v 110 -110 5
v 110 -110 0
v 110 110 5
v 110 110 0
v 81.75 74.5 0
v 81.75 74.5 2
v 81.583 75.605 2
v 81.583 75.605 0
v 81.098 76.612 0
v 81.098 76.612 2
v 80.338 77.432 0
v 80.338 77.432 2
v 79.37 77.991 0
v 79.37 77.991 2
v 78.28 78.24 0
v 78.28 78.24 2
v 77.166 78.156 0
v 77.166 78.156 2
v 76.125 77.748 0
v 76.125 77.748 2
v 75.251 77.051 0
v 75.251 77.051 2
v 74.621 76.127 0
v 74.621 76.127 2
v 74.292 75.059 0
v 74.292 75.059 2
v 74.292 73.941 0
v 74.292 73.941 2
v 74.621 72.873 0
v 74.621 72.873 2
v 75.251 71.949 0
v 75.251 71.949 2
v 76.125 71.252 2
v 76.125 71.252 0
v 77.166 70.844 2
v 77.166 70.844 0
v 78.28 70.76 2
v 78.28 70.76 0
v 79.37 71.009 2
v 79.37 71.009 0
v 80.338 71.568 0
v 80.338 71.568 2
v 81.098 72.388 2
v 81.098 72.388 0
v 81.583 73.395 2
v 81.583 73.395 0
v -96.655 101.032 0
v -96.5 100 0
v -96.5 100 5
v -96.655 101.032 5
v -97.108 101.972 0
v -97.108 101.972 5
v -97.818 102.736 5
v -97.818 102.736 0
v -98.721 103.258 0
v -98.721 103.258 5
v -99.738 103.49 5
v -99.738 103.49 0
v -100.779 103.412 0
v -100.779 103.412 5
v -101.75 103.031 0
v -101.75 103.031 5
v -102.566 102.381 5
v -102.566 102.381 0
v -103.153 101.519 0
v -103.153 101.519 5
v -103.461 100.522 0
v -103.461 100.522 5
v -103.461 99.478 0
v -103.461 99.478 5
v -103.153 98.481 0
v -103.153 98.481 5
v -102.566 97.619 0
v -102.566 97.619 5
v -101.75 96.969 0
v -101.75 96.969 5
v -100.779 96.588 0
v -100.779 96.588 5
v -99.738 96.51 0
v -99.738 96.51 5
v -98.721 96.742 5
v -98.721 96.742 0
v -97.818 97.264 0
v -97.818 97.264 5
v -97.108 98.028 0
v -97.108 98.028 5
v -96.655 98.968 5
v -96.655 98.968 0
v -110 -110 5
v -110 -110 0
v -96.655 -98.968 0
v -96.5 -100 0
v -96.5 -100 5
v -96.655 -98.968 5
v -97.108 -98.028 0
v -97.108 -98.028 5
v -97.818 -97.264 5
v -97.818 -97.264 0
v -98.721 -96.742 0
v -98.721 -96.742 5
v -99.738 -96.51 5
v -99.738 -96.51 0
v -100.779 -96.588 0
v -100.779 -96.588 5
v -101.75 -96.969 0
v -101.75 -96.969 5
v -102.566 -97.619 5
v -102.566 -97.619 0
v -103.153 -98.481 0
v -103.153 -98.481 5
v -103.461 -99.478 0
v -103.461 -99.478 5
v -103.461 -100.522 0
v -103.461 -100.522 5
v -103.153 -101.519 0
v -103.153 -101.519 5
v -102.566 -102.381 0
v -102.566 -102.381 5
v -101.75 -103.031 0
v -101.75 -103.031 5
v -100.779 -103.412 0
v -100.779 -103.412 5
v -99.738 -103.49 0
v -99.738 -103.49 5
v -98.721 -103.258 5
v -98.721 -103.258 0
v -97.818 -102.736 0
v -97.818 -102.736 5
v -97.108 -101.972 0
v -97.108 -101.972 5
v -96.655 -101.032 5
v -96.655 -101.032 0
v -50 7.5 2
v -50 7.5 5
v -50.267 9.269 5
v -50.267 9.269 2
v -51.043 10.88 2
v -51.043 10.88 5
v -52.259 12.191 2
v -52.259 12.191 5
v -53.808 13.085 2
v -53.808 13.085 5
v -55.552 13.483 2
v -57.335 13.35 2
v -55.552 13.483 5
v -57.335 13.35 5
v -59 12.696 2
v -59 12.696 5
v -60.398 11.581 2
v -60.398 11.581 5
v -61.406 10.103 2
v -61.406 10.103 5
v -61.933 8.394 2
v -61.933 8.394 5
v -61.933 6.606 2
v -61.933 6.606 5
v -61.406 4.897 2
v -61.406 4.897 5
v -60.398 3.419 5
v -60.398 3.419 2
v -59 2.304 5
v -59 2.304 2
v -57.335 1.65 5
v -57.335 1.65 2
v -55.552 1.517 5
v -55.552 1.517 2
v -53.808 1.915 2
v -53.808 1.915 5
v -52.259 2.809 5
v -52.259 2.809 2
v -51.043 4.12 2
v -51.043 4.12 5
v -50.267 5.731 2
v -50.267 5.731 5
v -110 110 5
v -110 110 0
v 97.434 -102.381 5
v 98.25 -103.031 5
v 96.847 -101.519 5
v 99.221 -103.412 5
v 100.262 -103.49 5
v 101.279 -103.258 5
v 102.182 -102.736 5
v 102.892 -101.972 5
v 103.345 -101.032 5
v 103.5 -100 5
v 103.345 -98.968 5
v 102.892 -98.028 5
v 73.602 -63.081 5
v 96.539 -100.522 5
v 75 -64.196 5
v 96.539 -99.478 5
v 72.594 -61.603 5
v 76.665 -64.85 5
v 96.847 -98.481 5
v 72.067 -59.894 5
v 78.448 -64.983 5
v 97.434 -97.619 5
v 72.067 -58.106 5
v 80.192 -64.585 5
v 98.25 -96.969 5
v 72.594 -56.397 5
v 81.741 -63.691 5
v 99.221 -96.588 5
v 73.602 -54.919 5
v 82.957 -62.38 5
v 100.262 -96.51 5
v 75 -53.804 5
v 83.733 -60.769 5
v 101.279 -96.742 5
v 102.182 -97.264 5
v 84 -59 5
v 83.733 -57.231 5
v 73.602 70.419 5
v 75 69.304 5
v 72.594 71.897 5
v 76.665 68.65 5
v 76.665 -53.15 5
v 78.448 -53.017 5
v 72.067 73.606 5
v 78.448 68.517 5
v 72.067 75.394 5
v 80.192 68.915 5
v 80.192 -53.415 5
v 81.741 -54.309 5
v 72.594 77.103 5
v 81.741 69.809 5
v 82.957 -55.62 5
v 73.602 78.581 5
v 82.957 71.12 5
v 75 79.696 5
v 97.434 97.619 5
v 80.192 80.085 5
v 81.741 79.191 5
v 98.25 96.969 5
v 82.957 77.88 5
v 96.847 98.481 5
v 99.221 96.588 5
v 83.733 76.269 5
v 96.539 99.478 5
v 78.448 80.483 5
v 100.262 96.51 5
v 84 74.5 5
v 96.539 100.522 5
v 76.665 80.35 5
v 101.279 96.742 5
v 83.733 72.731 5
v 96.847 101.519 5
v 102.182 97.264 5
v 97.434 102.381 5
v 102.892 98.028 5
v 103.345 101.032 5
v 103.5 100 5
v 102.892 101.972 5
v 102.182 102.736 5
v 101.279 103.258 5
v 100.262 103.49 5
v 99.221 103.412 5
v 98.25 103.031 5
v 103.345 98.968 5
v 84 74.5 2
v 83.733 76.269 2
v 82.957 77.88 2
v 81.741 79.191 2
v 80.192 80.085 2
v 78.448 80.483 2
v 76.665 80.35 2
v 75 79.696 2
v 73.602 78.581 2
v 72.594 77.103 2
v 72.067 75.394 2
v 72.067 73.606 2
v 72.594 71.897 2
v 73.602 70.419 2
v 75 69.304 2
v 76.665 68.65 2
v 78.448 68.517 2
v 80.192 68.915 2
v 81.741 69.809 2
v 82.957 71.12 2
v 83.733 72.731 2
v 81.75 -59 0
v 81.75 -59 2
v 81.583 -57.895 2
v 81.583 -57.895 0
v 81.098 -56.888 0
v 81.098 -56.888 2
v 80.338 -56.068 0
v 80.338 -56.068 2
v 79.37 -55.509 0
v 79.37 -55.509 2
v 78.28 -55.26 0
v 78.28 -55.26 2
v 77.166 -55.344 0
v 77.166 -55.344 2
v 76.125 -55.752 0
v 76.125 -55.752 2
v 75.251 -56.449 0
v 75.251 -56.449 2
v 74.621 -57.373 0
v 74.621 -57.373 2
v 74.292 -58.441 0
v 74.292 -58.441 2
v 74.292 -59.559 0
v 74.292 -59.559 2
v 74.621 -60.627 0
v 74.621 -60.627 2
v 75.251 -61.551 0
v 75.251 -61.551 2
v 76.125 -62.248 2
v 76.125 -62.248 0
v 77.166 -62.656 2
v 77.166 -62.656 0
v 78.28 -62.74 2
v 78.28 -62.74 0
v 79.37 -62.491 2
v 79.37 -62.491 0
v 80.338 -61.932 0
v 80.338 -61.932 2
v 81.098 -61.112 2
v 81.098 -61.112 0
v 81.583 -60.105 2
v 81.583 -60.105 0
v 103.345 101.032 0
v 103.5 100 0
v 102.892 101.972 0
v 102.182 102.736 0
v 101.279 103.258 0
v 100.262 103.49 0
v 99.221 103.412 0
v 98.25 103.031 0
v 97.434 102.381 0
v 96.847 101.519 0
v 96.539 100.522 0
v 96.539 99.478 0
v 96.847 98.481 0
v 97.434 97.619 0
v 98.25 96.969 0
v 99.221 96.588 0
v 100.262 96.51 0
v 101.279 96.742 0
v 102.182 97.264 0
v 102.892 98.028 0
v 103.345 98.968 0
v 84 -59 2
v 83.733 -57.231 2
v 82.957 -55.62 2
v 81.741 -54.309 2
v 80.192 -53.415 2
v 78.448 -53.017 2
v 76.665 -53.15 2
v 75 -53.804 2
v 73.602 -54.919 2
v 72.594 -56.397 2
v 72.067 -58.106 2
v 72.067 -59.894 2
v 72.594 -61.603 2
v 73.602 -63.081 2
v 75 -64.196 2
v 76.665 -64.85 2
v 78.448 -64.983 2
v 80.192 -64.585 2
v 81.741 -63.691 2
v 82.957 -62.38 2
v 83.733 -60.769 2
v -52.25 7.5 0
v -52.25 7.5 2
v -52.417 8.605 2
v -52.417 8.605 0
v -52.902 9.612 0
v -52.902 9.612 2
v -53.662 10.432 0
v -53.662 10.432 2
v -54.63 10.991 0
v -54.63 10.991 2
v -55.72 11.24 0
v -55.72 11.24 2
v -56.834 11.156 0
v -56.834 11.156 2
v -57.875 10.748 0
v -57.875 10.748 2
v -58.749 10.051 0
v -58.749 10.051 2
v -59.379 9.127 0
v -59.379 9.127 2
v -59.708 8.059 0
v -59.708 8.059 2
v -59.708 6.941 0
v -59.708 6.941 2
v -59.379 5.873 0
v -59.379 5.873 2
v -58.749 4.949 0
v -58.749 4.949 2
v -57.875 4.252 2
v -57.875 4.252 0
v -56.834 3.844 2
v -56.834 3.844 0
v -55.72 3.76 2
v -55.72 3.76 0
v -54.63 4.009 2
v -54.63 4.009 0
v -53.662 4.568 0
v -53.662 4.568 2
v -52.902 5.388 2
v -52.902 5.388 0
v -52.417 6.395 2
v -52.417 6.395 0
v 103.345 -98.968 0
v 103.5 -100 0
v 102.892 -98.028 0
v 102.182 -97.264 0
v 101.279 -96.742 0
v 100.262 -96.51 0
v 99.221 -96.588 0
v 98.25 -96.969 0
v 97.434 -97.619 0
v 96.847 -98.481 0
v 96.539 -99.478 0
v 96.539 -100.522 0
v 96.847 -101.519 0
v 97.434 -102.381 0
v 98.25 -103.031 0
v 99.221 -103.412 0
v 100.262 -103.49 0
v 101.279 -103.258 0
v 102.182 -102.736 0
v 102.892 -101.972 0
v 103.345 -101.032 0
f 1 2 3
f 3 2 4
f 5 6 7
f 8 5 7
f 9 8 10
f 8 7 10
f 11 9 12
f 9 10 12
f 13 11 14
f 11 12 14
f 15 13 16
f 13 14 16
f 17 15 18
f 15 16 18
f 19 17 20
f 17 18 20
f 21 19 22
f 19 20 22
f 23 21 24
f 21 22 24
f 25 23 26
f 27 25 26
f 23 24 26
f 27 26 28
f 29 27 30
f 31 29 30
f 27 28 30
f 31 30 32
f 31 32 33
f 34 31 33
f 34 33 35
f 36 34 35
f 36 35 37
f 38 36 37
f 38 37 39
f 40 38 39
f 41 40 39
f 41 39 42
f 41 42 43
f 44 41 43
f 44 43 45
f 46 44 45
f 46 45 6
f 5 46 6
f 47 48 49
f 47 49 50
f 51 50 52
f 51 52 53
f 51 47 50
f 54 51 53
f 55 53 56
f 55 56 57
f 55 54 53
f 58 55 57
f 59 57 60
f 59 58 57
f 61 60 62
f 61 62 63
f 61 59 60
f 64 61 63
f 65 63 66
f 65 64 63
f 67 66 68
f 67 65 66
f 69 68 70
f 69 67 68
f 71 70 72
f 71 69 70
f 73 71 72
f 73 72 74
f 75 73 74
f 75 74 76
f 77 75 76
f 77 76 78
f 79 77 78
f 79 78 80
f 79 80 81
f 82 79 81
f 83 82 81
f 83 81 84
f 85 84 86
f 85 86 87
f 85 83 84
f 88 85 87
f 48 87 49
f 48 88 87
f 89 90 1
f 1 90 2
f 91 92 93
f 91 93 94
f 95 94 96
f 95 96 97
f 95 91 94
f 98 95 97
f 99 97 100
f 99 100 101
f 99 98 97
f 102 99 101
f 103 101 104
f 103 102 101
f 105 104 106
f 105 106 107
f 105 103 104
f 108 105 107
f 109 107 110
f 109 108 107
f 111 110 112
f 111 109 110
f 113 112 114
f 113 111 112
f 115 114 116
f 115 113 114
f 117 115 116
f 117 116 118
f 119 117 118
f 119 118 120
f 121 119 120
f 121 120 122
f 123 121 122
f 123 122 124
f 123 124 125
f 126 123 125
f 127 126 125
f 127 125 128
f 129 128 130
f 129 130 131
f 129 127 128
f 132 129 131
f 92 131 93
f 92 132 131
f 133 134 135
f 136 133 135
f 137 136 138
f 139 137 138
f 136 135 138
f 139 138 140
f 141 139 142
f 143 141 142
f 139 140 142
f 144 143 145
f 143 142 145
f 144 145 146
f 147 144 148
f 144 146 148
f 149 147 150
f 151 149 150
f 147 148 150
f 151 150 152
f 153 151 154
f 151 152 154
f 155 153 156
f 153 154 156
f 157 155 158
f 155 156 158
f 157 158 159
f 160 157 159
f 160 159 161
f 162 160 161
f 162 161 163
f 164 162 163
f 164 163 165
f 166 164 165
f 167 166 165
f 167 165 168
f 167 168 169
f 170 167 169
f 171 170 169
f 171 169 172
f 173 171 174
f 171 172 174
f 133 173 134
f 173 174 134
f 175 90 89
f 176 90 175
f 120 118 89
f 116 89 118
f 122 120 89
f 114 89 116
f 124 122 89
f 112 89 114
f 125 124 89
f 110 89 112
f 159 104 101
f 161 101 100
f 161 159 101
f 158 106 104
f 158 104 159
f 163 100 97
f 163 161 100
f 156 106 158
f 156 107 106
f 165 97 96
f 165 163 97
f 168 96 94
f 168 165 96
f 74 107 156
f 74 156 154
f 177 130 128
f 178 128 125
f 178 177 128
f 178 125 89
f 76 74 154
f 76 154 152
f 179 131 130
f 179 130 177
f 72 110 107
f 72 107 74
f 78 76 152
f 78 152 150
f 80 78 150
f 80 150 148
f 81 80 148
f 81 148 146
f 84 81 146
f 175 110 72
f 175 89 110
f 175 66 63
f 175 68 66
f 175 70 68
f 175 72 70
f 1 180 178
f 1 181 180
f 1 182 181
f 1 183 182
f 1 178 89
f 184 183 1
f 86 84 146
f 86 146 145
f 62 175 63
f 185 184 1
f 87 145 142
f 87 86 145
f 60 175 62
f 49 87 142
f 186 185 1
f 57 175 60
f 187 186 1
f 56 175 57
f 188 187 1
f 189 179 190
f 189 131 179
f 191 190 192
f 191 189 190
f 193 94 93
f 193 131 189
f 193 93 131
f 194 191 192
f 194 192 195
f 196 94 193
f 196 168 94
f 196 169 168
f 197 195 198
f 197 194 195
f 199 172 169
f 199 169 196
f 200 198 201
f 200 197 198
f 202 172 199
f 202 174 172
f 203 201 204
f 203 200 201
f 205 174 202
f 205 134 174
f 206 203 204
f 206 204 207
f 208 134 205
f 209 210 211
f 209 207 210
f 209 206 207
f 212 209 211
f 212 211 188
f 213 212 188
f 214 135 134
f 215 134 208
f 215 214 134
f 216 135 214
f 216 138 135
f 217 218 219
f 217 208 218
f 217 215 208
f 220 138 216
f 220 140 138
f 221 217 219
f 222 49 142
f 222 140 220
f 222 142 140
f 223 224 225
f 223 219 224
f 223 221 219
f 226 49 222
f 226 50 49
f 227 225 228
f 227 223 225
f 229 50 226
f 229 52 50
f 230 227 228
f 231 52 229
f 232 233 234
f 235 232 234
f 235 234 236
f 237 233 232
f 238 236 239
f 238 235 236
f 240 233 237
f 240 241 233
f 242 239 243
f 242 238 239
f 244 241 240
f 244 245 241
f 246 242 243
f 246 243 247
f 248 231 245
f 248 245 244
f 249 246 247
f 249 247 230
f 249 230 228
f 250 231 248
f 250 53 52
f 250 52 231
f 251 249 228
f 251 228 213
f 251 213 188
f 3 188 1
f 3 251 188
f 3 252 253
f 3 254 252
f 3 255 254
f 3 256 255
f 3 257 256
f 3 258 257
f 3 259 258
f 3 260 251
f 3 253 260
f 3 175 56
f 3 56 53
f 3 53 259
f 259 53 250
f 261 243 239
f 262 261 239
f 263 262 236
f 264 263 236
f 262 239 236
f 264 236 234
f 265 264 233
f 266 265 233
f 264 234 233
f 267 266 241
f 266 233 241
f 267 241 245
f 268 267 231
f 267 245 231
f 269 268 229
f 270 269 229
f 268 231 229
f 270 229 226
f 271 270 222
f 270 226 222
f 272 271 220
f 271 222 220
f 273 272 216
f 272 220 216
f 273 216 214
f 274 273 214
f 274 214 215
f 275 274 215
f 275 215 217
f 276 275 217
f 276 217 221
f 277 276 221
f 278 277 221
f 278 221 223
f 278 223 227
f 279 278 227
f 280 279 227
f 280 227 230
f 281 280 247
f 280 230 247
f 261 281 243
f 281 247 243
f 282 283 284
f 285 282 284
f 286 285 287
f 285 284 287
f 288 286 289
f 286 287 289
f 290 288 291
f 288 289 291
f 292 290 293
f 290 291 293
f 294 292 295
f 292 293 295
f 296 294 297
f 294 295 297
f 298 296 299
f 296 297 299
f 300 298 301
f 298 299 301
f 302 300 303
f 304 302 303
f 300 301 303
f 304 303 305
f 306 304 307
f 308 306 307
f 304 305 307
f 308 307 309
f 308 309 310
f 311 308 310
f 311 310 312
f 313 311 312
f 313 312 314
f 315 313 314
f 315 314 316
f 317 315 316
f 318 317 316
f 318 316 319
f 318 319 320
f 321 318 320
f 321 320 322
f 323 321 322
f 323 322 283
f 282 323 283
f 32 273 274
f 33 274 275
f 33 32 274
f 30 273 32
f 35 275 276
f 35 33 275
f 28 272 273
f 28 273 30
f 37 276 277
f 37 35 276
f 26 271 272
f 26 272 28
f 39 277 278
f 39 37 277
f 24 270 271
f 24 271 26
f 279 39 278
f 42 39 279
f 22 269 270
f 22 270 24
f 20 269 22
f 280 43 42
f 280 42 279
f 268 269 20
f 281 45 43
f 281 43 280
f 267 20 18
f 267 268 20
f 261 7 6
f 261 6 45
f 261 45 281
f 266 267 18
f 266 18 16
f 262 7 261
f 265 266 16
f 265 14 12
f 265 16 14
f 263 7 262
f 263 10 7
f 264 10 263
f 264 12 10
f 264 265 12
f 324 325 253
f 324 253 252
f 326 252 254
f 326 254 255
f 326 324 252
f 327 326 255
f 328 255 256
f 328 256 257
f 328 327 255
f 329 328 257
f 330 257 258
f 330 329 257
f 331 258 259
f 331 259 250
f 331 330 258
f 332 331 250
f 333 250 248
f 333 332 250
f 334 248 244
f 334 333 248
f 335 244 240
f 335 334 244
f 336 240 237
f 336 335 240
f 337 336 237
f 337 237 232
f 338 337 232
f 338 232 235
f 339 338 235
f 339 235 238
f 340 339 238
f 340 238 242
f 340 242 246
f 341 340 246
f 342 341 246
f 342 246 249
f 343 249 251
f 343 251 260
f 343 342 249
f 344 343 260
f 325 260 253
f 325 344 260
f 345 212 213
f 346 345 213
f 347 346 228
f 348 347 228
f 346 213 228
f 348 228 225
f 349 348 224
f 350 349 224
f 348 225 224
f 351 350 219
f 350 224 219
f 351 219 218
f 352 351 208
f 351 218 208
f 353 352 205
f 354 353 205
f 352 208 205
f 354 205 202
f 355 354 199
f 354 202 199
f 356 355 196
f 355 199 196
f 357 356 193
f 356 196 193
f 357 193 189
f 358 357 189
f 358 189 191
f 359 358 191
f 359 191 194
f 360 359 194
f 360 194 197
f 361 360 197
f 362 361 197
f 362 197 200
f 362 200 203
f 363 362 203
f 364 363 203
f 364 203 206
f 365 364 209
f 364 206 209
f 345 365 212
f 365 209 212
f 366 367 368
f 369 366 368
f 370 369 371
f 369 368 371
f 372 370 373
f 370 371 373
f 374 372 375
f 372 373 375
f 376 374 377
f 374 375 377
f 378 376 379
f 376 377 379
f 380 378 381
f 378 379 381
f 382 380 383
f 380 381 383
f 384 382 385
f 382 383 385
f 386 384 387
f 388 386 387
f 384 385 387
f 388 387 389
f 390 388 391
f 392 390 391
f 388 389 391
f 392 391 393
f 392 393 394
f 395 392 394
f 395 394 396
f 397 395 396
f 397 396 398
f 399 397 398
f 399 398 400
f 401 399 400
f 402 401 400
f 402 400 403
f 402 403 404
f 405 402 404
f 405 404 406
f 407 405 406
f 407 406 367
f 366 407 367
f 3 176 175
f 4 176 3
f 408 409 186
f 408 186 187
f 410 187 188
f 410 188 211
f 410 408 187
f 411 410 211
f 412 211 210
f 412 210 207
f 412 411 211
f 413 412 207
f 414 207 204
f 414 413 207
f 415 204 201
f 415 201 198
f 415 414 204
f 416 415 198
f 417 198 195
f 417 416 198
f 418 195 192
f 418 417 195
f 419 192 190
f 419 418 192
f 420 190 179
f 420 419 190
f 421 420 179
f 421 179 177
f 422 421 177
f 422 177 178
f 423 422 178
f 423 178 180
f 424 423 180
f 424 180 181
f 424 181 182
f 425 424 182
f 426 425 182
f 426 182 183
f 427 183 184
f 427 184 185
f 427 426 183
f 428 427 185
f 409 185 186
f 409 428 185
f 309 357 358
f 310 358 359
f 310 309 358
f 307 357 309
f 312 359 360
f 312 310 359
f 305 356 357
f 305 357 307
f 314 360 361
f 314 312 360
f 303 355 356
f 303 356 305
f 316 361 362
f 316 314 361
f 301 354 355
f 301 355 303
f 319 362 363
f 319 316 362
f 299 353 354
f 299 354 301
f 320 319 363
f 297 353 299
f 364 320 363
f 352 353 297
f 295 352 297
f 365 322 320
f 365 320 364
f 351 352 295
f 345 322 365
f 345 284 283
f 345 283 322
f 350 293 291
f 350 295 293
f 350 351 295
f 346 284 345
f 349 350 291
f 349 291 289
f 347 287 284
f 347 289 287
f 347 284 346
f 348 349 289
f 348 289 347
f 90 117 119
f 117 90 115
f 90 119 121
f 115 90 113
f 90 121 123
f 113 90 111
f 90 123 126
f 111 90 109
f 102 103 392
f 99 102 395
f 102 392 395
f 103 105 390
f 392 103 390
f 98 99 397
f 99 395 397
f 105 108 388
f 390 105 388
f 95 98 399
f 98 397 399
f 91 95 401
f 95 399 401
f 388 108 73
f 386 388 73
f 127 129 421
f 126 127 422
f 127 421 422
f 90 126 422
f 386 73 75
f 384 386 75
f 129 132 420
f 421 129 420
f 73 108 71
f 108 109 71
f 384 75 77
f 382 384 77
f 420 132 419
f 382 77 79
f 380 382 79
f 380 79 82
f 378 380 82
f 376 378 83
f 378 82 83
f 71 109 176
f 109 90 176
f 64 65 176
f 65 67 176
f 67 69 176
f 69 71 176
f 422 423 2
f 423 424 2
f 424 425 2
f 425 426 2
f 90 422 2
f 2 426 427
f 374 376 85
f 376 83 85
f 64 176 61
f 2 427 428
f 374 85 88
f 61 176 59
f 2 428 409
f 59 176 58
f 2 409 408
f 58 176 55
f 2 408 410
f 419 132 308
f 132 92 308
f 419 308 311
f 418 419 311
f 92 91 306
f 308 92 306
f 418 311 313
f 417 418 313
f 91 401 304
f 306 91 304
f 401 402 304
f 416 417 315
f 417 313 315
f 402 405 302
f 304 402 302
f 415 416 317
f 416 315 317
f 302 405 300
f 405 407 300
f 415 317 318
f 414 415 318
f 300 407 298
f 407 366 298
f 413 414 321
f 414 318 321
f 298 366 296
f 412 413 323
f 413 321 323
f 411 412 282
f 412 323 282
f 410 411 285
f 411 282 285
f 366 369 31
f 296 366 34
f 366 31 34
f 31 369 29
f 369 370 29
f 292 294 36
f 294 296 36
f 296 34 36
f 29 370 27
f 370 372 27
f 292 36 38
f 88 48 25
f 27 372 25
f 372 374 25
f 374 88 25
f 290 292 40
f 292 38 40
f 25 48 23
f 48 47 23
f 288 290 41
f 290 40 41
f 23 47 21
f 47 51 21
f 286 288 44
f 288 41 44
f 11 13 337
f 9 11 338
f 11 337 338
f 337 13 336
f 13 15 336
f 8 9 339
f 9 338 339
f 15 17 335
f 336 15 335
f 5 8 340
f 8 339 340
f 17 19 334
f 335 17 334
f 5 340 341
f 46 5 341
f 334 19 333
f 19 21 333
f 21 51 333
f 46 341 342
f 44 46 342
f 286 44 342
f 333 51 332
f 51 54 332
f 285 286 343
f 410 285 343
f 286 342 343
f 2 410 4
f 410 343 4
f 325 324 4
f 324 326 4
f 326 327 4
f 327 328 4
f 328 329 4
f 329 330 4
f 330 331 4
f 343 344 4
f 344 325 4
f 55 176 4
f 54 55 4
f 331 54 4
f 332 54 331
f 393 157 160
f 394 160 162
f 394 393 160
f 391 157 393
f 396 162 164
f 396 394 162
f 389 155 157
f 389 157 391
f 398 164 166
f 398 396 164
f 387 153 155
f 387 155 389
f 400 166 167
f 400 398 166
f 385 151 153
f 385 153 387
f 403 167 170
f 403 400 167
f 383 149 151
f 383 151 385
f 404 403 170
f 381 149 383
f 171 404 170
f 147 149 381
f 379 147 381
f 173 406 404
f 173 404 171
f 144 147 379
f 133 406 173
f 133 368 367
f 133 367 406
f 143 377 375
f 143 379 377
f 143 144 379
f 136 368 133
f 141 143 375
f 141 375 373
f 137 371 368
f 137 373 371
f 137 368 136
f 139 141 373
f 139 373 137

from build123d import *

# Parameters (mm, degrees)
F0_W     = 220
F0_H     = 220
F0_R     = 3.5
F1_DEPTH = 5
F2_R     = 3.75
F3_DEPTH = 5.001
F4_R     = 6
F5_DEPTH = 3


with BuildPart() as f1:
    # F0 (on Top) → F1 (new body)
    with BuildSketch(Plane.XY):
        Rectangle(F0_W, F0_H)
        with Locations((-100, -100)):
            Circle(F0_R, mode=Mode.SUBTRACT)
        with Locations((100, -100)):
            Circle(F0_R, mode=Mode.SUBTRACT)
        with Locations((-100, 100)):
            Circle(F0_R, mode=Mode.SUBTRACT)
        with Locations((100, 100)):
            Circle(F0_R, mode=Mode.SUBTRACT)
    extrude(amount=F1_DEPTH)

    # F2 (on face) → F3 (cut, through all)
    with BuildSketch(Plane.XY.offset(5)):
        with Locations((-56, 7.5)):
            Circle(F2_R)
        with Locations((78, 74.5)):
            Circle(F2_R)
        with Locations((78, -59)):
            Circle(F2_R)
    extrude(amount=-F3_DEPTH, mode=Mode.SUBTRACT)

    # F4 (on face) → F5 (cut)
    with BuildSketch(Plane.XY.offset(5)):
        with Locations((-56, 7.5)):
            Circle(F4_R)
        with Locations((78, 74.5)):
            Circle(F4_R)
        with Locations((78, -59)):
            Circle(F4_R)
    extrude(amount=-F5_DEPTH, mode=Mode.SUBTRACT)


solid = f1.part
